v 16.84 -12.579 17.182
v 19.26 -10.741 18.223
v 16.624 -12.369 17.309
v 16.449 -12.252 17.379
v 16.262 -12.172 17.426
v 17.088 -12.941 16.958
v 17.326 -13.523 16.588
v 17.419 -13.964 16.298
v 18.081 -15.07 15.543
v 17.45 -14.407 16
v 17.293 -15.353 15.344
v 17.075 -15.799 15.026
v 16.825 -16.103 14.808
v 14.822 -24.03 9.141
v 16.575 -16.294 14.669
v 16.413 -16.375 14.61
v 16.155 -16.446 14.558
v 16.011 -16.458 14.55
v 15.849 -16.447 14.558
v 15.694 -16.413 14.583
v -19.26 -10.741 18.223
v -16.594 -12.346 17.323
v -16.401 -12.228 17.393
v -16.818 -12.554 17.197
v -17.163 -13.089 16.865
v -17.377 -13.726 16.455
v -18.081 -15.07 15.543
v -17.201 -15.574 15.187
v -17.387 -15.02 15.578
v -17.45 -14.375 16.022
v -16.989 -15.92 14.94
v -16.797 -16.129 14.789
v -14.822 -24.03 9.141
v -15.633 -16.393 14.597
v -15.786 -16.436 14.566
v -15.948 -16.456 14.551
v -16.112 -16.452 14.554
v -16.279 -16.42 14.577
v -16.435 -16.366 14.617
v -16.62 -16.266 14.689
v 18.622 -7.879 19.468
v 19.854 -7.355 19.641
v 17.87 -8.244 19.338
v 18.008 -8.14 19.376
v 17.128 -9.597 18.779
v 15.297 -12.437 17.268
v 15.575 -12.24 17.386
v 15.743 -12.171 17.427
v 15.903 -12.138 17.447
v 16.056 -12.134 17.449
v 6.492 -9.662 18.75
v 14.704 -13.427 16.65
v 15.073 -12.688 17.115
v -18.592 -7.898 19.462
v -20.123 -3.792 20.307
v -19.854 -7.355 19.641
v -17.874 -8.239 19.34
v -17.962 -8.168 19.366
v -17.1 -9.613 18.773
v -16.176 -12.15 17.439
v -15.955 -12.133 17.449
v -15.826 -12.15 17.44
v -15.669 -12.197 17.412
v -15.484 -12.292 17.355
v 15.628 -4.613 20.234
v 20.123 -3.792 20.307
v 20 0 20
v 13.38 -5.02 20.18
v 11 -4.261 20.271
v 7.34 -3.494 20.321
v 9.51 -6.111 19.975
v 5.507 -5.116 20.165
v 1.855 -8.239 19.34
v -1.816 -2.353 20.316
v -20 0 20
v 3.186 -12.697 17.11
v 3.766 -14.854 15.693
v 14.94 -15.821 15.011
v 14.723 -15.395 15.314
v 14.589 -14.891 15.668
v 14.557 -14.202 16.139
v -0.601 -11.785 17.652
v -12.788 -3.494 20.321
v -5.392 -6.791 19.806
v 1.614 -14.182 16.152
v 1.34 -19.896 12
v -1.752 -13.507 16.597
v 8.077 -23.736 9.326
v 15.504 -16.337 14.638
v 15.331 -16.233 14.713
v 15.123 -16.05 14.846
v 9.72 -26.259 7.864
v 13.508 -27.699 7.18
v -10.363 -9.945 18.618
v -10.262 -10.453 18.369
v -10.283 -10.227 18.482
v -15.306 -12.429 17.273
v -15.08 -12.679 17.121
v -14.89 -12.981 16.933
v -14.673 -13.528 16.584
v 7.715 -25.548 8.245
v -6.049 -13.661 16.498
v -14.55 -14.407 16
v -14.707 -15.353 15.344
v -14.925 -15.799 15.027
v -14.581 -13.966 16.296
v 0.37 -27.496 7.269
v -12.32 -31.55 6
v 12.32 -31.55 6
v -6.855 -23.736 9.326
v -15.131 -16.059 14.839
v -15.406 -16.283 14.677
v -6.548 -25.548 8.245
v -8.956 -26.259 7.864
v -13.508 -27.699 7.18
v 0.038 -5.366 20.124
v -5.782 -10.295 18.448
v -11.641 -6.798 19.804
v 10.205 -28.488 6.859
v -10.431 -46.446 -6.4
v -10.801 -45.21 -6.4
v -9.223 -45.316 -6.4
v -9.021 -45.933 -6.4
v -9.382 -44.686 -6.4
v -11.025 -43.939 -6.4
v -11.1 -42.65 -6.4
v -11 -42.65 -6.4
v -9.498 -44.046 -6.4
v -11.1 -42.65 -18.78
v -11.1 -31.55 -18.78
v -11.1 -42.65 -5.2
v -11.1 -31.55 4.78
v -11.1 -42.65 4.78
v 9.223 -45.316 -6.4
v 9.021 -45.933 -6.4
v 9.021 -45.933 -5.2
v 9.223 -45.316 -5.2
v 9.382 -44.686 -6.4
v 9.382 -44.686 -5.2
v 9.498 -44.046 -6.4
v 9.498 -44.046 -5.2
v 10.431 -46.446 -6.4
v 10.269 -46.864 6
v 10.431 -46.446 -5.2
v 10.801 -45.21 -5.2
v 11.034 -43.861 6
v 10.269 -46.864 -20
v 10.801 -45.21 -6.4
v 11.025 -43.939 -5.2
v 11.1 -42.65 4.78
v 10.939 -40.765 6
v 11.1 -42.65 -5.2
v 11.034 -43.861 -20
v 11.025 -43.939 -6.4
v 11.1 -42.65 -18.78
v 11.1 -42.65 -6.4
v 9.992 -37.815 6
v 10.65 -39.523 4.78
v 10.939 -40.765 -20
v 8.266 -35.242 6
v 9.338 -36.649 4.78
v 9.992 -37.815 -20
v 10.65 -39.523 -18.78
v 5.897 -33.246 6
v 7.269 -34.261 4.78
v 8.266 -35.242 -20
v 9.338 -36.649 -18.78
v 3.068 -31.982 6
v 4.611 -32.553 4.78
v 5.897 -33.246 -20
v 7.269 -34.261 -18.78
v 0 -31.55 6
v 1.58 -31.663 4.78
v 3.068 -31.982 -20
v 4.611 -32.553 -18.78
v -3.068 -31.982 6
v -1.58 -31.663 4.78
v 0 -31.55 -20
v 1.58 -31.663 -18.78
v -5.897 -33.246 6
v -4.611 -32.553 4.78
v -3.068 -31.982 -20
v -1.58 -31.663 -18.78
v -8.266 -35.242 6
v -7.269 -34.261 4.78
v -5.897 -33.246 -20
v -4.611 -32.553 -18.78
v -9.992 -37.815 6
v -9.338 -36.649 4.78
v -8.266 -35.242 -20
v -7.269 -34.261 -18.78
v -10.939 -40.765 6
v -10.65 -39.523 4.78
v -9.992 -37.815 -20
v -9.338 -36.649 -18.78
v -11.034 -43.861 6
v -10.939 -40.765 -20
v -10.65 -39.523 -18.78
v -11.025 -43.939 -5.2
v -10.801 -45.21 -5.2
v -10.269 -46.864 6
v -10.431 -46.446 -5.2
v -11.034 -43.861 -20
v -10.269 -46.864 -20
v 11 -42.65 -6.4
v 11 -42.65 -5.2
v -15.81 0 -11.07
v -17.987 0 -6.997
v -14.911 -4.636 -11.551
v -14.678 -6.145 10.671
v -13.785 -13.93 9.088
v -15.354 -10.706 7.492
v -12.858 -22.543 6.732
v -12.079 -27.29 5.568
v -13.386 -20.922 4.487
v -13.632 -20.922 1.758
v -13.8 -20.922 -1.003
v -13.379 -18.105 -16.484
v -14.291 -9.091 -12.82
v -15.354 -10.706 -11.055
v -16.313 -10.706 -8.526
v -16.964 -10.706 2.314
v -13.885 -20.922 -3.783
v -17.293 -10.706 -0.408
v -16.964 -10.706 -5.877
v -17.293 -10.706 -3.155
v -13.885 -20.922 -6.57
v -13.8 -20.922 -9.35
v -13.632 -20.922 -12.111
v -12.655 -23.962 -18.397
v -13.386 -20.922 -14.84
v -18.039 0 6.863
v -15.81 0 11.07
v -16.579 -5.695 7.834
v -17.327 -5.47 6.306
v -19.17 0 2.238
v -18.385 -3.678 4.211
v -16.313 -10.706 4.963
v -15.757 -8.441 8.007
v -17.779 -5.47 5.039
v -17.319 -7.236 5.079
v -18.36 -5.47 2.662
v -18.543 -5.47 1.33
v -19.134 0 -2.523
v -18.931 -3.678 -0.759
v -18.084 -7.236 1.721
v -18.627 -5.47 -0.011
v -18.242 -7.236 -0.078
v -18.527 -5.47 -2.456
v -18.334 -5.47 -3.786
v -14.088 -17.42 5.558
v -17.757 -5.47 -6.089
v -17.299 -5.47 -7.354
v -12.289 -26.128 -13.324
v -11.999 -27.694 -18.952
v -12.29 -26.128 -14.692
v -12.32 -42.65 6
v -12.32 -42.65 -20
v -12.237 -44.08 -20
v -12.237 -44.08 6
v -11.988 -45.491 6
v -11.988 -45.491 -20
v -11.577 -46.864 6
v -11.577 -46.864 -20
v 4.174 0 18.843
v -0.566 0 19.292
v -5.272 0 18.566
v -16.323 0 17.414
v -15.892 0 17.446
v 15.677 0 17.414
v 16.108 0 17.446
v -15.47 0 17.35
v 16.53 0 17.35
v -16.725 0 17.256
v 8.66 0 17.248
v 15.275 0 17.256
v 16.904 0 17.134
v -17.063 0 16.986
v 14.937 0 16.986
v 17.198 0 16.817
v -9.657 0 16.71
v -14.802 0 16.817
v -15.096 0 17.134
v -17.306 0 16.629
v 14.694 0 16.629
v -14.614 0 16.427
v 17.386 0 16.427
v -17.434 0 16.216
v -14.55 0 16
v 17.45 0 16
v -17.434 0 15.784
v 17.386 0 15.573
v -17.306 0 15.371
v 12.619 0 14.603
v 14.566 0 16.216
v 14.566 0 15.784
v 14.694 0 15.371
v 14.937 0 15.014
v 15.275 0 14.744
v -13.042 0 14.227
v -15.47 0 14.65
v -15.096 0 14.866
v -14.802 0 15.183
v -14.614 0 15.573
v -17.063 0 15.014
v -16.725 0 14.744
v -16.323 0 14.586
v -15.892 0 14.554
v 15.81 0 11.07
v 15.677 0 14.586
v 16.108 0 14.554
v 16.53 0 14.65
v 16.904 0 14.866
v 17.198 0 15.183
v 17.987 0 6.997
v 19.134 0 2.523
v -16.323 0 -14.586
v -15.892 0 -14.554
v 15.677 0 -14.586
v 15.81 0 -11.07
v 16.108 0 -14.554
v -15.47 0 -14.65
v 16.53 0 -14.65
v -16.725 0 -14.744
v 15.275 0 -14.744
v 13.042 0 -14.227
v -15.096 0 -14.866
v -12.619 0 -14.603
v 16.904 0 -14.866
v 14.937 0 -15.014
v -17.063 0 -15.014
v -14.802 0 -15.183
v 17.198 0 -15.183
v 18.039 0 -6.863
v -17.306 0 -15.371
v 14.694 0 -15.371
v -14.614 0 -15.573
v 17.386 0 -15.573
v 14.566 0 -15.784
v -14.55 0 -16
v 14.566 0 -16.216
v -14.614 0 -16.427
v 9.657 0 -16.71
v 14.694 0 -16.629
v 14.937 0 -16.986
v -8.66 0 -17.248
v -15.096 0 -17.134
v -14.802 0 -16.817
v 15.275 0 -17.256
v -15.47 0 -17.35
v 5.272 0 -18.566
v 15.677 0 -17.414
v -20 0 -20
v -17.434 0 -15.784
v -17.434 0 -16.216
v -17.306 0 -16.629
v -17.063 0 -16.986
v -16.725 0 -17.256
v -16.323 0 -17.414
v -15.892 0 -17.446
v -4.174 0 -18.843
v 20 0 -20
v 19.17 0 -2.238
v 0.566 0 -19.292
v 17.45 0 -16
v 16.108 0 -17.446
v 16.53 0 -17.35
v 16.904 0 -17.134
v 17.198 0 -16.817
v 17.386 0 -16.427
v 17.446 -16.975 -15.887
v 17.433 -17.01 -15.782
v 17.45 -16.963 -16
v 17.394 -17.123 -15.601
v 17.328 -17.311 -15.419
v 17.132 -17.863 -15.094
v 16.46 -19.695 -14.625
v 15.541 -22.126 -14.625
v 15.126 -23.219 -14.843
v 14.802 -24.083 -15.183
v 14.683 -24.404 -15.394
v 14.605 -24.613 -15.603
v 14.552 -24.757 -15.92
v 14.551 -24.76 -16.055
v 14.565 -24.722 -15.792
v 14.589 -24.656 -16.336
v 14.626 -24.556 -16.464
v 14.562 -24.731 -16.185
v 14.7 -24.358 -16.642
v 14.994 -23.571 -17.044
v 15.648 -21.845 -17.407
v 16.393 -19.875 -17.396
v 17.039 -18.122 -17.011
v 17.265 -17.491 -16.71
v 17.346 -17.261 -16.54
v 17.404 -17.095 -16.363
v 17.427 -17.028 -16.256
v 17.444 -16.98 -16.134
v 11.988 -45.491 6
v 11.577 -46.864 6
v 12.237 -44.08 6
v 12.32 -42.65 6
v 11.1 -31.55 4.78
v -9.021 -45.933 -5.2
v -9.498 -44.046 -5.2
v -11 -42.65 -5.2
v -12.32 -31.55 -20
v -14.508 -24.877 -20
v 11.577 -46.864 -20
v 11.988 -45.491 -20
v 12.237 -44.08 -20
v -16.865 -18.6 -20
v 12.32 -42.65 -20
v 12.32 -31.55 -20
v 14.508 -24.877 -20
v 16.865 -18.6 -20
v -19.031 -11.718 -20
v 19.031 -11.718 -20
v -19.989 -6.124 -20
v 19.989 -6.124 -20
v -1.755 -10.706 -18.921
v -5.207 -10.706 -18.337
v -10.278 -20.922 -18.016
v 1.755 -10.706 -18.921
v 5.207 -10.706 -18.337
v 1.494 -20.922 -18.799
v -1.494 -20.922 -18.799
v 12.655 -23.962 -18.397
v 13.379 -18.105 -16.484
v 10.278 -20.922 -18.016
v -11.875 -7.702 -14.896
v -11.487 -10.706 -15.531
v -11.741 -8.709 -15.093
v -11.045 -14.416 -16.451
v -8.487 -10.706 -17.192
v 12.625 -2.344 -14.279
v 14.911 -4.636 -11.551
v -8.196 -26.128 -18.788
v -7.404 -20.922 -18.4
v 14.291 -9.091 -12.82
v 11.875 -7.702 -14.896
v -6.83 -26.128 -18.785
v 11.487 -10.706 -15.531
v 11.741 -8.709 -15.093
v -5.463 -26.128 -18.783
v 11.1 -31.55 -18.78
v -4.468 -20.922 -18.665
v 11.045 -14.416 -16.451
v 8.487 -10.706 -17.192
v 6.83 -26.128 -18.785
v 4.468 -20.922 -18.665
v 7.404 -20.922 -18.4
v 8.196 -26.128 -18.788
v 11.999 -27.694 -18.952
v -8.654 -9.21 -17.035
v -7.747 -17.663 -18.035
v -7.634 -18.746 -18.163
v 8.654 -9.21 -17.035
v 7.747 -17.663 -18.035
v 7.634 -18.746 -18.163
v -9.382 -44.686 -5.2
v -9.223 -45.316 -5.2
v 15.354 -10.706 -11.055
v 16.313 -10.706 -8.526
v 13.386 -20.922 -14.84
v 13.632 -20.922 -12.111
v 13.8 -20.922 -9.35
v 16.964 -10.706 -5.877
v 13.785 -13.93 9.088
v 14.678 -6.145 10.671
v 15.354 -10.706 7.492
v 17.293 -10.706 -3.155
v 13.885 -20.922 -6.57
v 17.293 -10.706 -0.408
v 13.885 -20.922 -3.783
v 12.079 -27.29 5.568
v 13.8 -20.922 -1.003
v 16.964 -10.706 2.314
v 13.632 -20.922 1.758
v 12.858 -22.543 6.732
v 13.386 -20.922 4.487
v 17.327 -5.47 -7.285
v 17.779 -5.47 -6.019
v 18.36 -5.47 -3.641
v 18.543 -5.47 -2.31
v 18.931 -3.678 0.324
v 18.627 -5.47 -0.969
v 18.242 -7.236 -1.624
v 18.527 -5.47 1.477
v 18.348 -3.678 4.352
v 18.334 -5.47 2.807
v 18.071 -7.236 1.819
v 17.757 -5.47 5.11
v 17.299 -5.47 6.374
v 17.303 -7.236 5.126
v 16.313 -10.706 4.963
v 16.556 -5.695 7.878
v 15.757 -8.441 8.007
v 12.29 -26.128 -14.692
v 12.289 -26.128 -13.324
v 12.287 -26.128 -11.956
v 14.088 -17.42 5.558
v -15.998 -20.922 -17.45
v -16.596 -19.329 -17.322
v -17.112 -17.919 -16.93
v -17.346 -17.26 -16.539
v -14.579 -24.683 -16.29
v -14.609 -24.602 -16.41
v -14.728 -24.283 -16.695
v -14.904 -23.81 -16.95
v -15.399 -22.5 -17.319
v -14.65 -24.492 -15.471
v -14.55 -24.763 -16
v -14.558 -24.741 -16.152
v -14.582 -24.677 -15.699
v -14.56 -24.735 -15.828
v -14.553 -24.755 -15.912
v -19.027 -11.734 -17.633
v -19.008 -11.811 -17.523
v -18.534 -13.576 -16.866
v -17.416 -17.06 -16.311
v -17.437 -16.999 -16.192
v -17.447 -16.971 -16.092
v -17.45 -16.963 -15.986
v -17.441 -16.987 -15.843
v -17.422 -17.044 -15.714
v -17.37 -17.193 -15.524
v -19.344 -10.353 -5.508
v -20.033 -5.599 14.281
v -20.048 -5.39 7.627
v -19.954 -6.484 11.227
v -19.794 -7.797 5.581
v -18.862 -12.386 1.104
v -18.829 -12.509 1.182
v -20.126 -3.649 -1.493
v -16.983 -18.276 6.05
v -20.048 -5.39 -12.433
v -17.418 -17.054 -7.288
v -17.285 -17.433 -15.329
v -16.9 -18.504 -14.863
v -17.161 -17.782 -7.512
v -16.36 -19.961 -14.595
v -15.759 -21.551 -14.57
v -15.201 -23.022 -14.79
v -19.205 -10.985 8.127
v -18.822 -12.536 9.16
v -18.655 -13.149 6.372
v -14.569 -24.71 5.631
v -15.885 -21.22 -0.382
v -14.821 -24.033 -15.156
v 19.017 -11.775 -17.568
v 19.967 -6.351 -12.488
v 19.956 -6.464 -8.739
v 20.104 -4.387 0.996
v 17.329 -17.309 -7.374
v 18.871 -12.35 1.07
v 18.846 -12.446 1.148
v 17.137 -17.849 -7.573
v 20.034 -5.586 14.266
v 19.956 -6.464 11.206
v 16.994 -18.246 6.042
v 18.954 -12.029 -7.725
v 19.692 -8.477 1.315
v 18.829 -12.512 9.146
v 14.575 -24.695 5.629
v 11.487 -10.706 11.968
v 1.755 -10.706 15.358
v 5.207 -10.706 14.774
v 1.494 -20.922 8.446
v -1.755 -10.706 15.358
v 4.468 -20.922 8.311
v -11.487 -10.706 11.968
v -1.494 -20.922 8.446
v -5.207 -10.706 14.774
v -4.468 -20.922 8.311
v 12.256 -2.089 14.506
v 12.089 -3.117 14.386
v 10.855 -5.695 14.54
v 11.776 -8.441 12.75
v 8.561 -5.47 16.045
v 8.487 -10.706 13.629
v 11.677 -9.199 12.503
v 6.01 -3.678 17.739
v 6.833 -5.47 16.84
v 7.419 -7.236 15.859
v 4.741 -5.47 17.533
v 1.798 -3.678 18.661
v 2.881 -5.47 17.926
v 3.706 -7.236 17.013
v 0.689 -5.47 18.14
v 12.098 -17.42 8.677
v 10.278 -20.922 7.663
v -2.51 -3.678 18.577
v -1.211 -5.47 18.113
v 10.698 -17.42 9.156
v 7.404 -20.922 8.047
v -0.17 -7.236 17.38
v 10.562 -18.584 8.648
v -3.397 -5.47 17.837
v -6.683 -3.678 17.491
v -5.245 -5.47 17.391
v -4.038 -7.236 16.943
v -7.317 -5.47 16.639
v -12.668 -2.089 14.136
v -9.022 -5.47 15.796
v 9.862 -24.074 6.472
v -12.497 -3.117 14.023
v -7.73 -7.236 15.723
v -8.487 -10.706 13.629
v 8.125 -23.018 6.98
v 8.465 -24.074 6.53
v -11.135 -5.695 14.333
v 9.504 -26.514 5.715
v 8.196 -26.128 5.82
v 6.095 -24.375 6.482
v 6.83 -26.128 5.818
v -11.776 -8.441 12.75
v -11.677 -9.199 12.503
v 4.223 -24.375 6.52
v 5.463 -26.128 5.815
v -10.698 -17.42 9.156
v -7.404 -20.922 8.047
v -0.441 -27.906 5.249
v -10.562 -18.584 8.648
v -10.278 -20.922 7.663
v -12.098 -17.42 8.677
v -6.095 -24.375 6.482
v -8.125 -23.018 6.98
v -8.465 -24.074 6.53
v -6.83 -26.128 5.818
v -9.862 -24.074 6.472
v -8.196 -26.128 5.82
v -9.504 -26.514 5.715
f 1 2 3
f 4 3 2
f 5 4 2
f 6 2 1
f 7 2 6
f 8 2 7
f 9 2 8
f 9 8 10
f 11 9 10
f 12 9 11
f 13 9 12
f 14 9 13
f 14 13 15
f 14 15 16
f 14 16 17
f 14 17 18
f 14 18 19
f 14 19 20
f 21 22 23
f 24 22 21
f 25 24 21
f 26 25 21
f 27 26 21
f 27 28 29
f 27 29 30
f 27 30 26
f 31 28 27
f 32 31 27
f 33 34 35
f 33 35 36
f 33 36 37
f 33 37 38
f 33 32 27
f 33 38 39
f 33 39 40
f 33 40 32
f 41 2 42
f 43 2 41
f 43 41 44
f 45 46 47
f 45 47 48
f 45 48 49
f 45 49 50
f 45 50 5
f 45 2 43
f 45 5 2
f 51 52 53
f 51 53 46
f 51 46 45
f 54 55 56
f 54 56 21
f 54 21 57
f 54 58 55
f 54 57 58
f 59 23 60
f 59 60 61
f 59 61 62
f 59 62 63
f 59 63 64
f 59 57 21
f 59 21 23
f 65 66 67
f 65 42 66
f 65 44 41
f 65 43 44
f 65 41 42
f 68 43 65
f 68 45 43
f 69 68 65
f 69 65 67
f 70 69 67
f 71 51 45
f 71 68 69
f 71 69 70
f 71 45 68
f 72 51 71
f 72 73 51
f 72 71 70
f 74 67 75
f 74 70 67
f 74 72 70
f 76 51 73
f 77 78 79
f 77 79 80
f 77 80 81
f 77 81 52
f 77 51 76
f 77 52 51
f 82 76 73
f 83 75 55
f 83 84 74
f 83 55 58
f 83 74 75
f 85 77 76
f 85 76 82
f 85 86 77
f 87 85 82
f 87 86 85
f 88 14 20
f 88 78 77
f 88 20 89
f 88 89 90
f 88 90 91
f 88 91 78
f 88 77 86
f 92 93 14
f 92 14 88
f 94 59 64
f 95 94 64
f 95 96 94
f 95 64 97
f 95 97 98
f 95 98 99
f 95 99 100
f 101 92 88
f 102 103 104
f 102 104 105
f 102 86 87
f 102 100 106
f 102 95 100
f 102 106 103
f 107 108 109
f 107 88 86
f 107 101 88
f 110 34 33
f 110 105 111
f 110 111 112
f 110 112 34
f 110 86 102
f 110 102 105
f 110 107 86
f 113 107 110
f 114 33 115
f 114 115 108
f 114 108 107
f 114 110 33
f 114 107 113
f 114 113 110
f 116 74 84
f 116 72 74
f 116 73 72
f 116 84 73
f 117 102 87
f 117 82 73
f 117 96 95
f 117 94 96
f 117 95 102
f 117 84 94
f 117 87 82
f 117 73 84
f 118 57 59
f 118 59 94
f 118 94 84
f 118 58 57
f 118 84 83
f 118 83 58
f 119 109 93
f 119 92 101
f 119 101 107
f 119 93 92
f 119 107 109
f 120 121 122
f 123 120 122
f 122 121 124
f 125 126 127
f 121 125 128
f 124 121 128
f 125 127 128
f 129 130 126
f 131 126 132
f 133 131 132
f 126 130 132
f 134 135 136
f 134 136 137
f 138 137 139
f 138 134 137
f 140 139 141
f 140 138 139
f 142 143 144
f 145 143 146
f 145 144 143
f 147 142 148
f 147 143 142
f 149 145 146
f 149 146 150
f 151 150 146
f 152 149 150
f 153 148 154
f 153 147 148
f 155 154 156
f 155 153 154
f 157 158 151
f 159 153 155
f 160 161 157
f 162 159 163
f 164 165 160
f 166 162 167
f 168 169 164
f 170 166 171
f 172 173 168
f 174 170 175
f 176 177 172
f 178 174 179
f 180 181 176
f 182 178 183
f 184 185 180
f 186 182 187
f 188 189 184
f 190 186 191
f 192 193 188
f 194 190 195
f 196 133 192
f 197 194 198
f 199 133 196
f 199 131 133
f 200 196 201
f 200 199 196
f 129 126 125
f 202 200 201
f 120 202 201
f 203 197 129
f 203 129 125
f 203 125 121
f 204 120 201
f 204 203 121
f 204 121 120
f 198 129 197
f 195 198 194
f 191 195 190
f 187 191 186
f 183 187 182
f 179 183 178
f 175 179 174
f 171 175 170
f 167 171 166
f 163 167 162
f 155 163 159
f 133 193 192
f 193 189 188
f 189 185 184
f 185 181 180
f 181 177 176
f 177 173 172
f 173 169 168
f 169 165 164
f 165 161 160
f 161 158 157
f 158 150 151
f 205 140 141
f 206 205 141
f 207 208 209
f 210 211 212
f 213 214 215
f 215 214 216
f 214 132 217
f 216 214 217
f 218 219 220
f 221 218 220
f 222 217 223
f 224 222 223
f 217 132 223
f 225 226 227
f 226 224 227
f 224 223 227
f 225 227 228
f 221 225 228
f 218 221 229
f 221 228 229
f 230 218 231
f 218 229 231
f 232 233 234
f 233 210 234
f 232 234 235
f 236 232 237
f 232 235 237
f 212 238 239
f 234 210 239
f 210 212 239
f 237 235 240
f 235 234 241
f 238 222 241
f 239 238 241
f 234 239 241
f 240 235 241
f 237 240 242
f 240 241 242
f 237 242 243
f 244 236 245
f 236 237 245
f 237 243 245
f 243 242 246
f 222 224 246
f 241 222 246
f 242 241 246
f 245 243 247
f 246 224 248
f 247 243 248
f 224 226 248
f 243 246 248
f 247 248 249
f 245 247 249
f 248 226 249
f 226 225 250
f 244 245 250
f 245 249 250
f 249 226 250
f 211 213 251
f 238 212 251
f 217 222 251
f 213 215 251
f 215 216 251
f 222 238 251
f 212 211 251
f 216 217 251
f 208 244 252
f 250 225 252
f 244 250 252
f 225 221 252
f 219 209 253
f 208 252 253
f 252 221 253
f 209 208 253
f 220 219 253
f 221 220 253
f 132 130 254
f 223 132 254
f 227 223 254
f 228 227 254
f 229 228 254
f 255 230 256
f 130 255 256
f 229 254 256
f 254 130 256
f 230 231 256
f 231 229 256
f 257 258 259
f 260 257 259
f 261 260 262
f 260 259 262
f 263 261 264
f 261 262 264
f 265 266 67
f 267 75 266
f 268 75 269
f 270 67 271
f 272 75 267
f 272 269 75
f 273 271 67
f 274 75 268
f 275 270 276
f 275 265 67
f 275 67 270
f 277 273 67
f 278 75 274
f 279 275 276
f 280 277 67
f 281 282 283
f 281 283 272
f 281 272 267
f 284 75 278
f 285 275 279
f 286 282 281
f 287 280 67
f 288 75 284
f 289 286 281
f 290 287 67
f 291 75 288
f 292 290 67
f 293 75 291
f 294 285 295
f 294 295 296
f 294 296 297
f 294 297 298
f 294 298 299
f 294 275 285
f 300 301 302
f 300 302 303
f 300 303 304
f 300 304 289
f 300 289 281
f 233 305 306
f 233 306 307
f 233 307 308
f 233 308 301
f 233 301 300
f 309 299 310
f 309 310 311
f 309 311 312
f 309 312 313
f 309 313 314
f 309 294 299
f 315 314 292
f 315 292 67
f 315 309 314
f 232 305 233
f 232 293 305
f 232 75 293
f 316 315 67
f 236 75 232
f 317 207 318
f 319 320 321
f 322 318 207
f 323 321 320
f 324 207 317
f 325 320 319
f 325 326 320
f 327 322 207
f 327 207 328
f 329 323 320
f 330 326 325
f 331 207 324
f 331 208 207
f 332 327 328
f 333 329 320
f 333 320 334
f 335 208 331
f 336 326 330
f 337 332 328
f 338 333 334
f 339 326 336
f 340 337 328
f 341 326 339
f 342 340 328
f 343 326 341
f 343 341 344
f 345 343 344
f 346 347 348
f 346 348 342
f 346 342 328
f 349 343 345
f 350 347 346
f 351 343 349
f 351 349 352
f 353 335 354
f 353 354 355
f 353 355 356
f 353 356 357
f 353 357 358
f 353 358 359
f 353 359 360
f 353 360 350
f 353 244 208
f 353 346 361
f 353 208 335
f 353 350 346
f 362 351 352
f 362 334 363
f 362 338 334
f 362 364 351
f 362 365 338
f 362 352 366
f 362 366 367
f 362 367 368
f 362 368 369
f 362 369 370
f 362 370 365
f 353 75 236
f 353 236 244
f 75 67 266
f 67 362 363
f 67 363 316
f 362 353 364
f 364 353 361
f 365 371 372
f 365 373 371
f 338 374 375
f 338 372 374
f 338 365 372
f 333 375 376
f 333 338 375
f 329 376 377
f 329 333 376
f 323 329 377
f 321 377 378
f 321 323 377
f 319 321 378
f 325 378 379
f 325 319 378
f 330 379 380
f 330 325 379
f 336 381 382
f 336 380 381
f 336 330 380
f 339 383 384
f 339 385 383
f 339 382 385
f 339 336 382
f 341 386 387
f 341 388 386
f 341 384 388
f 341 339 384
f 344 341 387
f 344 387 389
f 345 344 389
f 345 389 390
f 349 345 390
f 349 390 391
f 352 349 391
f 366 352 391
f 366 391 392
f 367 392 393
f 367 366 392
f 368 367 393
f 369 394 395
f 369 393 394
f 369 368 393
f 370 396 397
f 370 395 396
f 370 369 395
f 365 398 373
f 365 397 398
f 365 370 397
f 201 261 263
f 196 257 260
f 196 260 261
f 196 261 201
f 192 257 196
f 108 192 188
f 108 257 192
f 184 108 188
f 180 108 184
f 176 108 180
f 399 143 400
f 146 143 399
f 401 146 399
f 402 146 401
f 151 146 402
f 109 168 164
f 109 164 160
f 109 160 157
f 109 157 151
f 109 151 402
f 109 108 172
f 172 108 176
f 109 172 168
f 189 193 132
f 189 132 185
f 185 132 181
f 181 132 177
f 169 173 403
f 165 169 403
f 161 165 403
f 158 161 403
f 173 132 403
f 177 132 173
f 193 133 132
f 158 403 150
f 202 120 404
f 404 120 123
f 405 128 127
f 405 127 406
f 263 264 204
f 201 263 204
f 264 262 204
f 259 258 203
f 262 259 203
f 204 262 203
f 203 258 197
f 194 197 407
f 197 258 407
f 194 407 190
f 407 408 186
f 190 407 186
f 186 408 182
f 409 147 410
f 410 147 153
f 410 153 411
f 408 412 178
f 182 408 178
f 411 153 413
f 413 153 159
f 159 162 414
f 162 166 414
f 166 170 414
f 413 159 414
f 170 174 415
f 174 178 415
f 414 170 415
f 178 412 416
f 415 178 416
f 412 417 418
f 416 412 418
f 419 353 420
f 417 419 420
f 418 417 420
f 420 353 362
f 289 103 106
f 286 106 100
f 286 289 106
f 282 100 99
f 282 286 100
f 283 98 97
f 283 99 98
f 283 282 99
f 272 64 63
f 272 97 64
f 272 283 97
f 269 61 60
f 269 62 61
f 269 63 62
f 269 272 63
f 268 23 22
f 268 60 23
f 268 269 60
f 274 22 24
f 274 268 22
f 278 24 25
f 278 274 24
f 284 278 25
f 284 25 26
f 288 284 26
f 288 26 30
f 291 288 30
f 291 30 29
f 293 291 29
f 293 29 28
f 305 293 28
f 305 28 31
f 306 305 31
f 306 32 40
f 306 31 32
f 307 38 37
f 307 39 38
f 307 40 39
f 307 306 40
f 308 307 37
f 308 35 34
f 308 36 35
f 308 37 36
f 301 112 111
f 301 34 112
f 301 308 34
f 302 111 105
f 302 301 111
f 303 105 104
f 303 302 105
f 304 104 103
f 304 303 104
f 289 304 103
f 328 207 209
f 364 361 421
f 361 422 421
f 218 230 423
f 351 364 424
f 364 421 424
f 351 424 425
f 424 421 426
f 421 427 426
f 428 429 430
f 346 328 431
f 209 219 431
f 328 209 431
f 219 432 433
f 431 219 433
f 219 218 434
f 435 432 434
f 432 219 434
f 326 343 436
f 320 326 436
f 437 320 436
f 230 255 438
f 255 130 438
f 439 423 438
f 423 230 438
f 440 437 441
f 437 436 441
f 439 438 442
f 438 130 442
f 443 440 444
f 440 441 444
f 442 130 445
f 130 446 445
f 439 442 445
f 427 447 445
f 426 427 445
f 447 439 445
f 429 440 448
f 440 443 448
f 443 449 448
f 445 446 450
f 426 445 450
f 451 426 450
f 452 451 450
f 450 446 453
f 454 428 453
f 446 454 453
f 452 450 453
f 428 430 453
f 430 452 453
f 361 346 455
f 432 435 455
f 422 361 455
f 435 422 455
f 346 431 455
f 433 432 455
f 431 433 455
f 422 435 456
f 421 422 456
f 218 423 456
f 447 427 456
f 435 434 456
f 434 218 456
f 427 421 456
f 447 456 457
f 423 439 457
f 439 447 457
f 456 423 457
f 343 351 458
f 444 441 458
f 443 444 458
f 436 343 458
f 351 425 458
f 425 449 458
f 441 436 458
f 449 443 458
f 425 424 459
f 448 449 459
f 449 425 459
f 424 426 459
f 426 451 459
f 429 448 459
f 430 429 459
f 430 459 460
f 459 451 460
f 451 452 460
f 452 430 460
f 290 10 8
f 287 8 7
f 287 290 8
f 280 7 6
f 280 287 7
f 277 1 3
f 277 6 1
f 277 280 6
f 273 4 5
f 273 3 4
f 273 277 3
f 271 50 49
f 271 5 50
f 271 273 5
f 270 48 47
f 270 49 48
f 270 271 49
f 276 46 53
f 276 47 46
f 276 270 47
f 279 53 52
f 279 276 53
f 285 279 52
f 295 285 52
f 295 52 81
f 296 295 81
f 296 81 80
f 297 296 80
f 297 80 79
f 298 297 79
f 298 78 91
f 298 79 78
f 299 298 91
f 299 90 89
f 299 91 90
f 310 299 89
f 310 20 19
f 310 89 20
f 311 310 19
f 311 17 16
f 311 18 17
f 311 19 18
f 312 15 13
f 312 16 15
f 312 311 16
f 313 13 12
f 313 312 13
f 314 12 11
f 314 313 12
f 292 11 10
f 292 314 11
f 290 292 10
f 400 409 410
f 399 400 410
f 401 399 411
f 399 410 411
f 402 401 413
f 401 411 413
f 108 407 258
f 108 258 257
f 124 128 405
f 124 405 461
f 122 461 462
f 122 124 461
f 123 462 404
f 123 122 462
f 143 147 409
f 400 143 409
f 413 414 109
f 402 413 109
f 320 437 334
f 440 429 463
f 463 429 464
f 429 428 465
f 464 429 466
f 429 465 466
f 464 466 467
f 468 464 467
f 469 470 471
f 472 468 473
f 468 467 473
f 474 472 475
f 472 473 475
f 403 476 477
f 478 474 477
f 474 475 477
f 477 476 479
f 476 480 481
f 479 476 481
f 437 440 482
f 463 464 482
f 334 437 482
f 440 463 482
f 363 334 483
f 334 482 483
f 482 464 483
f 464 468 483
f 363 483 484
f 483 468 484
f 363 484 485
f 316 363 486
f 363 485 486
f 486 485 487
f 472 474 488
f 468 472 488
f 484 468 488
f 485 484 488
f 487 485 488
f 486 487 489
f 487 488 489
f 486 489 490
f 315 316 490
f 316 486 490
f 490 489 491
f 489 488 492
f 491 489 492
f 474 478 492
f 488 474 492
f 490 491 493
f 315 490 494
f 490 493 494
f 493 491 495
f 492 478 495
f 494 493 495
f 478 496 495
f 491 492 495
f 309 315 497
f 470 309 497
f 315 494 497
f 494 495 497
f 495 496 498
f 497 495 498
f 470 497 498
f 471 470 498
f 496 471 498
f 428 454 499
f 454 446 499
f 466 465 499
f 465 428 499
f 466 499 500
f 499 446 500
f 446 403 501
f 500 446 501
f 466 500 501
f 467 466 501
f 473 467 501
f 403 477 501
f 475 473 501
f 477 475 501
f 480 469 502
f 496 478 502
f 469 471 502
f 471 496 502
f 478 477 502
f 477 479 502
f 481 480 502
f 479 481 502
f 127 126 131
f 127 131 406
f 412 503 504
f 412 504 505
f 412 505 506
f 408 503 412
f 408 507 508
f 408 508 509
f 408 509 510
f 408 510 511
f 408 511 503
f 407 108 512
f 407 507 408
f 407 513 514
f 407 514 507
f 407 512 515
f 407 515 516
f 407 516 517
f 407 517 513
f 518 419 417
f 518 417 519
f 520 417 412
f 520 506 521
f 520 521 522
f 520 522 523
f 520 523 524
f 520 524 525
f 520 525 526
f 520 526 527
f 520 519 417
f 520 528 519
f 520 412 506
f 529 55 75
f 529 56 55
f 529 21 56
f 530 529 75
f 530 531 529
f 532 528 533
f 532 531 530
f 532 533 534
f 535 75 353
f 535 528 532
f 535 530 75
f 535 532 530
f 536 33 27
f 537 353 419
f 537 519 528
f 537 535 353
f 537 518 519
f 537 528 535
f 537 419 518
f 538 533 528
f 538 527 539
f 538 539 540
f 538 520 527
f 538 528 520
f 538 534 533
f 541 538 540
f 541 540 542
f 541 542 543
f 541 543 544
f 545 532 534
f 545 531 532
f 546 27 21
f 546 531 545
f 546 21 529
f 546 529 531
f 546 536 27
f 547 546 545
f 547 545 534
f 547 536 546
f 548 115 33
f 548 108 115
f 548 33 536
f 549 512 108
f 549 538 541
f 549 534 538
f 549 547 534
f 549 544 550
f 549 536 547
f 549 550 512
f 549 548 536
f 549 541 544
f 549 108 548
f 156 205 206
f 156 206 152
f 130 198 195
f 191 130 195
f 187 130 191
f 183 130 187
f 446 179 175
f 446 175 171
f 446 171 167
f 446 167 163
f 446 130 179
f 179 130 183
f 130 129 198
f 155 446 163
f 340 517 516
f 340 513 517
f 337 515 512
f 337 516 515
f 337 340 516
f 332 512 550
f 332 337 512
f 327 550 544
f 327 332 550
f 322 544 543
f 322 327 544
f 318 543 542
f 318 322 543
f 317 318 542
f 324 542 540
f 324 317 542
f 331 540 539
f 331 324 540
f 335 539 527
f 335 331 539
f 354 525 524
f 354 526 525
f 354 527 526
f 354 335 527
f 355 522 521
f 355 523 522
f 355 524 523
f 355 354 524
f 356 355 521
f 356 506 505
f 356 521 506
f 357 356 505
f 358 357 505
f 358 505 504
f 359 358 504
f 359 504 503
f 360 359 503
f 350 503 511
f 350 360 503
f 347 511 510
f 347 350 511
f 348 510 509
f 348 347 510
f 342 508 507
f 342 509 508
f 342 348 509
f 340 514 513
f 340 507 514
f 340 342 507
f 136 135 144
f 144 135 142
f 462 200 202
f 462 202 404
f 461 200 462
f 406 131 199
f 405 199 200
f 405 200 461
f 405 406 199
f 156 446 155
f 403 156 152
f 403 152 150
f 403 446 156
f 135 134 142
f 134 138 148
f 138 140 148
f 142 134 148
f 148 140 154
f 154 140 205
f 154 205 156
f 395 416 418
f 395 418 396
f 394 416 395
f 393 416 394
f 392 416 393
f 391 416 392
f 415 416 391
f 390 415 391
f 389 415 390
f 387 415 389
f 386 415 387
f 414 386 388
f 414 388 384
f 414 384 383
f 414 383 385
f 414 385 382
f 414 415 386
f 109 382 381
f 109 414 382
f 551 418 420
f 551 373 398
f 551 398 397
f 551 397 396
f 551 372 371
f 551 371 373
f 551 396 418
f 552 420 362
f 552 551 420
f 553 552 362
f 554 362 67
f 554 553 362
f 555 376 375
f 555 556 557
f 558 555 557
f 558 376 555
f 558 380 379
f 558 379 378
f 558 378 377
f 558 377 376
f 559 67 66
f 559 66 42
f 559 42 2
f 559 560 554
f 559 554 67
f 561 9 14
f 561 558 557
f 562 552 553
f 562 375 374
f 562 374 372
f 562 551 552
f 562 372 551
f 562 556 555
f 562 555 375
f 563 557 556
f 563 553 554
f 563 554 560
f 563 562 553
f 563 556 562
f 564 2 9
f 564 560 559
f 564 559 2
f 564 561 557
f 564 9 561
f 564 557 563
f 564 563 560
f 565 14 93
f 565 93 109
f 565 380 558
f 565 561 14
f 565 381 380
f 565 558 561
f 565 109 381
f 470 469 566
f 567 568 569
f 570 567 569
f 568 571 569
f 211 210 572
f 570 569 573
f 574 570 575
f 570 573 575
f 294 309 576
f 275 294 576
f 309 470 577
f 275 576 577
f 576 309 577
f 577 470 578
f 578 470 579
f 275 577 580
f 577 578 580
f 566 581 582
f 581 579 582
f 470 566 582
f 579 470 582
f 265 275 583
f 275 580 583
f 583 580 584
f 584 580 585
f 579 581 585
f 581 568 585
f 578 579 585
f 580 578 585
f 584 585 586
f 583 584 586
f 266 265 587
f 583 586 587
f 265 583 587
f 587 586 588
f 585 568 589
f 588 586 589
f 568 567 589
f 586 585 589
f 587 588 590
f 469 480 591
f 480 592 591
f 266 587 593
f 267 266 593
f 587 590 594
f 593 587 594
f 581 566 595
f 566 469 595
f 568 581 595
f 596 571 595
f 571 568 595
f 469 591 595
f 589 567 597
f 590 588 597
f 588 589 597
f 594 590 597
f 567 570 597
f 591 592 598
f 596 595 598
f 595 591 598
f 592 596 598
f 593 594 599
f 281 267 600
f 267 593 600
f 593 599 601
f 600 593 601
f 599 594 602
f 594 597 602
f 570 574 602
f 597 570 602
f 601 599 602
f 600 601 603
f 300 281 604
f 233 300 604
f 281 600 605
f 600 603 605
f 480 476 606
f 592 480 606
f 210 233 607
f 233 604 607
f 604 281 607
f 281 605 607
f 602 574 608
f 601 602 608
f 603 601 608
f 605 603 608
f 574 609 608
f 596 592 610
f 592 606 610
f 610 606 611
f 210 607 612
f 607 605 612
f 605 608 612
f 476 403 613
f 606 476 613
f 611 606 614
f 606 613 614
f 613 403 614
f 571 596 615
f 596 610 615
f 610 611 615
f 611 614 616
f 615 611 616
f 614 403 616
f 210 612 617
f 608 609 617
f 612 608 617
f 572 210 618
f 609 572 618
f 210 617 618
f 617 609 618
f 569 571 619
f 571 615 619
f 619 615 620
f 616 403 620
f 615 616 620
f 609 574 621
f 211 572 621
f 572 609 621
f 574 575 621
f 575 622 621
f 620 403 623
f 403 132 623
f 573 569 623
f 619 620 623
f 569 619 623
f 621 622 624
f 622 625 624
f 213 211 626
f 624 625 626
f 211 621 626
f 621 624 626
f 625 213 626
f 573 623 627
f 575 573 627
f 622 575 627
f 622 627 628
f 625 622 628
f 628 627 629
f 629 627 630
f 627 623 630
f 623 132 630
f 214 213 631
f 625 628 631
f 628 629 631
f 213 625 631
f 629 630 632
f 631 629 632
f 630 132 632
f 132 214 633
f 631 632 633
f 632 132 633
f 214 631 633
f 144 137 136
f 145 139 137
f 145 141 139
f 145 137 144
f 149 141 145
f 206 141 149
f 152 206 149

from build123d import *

# Parameters (mm, degrees)
SKETCH_W        = 40
SKETCH_H        = 40
SKETCH001_W     = 40
SKETCH001_H     = 40
SKETCH002_W     = 28.2
SKETCH002_H     = 28
SKETCH015_W     = 24.64
SKETCH015_H     = 26
SKETCH003_W     = 24.64
SKETCH003_H     = 26
PAD001_DEPTH    = 11.10001
PAD_DEPTH       = 26
SKETCH013_W     = 24.64
SKETCH013_H     = 24.64
SKETCH009_W     = 22.2
SKETCH009_H     = 23.56
SKETCH017_W     = 22.2
SKETCH017_H     = 23.56
POCKET001_DEPTH = 11.10001
SKETCH010_R     = 11.1
POCKET_DEPTH    = 40
PAD002_DEPTH    = 1.2
SKETCH011_R     = 1.45
POCKET002_DEPTH = 46.864698
CHAMFER_SIZE    = 1.4


with BuildPart() as part:
    # Sketch → AdditiveLoft section 0
    with BuildSketch(Plane.XZ):
        Rectangle(SKETCH_W, SKETCH_H)
    # Sketch001 → AdditiveLoft section 1
    with BuildSketch(Plane.XZ.offset(6)):
        Rectangle(SKETCH001_W, SKETCH001_H)
    # Sketch002 → AdditiveLoft section 2
    with BuildSketch(Plane.XZ.offset(26)):
        with Locations((0, -6)):
            Rectangle(SKETCH002_W, SKETCH002_H)
    # Sketch015 → AdditiveLoft section 3
    with BuildSketch(Plane.XZ.offset(31.55)):
        with Locations((0, -7)):
            Rectangle(SKETCH015_W, SKETCH015_H)
    loft()

    # Sketch003 → Pad001 (new body)
    with BuildSketch(Plane.XZ.offset(31.55)):
        with Locations((0, -7)):
            Rectangle(SKETCH003_W, SKETCH003_H)
    extrude(amount=PAD001_DEPTH)

    # Sketch004 → Pad (join)
    with BuildSketch(Plane.XY.offset(-20)):
        with BuildLine():
            ThreePointArc((11.577013, -46.863698), (0, -30.33001), (-11.577013, -46.863698))
            Line((-11.577013, -46.863698), (11.577013, -46.863698))
        make_face()
    extrude(amount=PAD_DEPTH)

    # Sketch006 → SubtractiveLoft section 0
    with BuildSketch(Plane.XZ):
        with BuildLine():
            ThreePointArc((15.809634, 11.070025), (0, 19.3), (-15.809634, 11.070025))
            ThreePointArc((-15.809634, 11.070025), (-19.3, 0), (-15.809634, -11.070025))
            ThreePointArc((-15.809634, -11.070025), (0, -19.3), (15.809634, -11.070025))
            ThreePointArc((15.809634, -11.070025), (19.3, 0), (15.809634, 11.070025))
        make_face()
    # Sketch005 → SubtractiveLoft section 1
    with BuildSketch(Plane.XZ.offset(6)):
        with BuildLine():
            ThreePointArc((14.699251, 10.690132), (0, 17.939), (-14.699251, 10.690132))
            ThreePointArc((-14.699251, 10.690132), (-18.528, -0.589), (-14.699251, -11.868132))
            ThreePointArc((-14.699251, -11.868132), (0, -19.117), (14.699251, -11.868132))
            ThreePointArc((14.699251, -11.868132), (18.528, -0.589), (14.699251, 10.690132))
        make_face()
    # Sketch013 → SubtractiveLoft section 2
    with BuildSketch(Plane.XZ.offset(26)):
        with Locations((0, -6.46)):
            Rectangle(SKETCH013_W, SKETCH013_H)
    # Sketch009 → SubtractiveLoft section 3
    with BuildSketch(Plane.XZ.offset(31.55)):
        with Locations((0, -7)):
            Rectangle(SKETCH009_W, SKETCH009_H)
    loft(mode=Mode.SUBTRACT)

    # Sketch017 → Pocket001 (cut)
    with BuildSketch(Plane.XZ.offset(31.55)):
        with Locations((0, -7)):
            Rectangle(SKETCH017_W, SKETCH017_H)
    extrude(amount=POCKET001_DEPTH, mode=Mode.SUBTRACT)

    # Sketch010 → Pocket (cut)
    with BuildSketch(Plane.XY.offset(-20)):
        with Locations((0, -42.65001)):
            Circle(SKETCH010_R)
    extrude(amount=POCKET_DEPTH, mode=Mode.SUBTRACT)

    # Sketch012 → Pad002 (join)
    with BuildSketch(Plane.XY.offset(-6.4)):
        with BuildLine():
            ThreePointArc((-11.2, -42.65001), (-11.029847, -44.59487), (-10.524557, -46.480636))
            Line((-10.524557, -46.480636), (-9.021049, -45.933403))
            ThreePointArc((-9.6, -42.65001), (-9.454154, -44.317033), (-9.021049, -45.933403))
            Line((-11.2, -42.65001), (-9.6, -42.65001))
        make_face()
        with BuildLine():
            Line((9.021049, -45.933403), (10.524557, -46.480636))
            ThreePointArc((10.524557, -46.480636), (11.029847, -44.59487), (11.2, -42.65001))
            Line((9.6, -42.65001), (11.2, -42.65001))
            ThreePointArc((9.021049, -45.933403), (9.454154, -44.317033), (9.6, -42.65001))
        make_face()
    extrude(amount=PAD002_DEPTH)

    # Sketch011 → Pocket002 (cut, through all)
    with BuildSketch(Plane.XZ):
        with Locations((-16, 16)):
            Circle(SKETCH011_R)
        with Locations((16, 16)):
            Circle(SKETCH011_R)
        with Locations((16, -16)):
            Circle(SKETCH011_R)
        with Locations((-16, -16)):
            Circle(SKETCH011_R)
    extrude(amount=POCKET002_DEPTH, mode=Mode.SUBTRACT)

    # Chamfer
    chamfer_edges = [part.edges().sort_by_distance(p)[0] for p in [
        (9.6, -42.65001, -5.8),
        (-9.6, -42.65001, -5.8),
    ]]
    chamfer(chamfer_edges, length=CHAMFER_SIZE)


solid = part.part
